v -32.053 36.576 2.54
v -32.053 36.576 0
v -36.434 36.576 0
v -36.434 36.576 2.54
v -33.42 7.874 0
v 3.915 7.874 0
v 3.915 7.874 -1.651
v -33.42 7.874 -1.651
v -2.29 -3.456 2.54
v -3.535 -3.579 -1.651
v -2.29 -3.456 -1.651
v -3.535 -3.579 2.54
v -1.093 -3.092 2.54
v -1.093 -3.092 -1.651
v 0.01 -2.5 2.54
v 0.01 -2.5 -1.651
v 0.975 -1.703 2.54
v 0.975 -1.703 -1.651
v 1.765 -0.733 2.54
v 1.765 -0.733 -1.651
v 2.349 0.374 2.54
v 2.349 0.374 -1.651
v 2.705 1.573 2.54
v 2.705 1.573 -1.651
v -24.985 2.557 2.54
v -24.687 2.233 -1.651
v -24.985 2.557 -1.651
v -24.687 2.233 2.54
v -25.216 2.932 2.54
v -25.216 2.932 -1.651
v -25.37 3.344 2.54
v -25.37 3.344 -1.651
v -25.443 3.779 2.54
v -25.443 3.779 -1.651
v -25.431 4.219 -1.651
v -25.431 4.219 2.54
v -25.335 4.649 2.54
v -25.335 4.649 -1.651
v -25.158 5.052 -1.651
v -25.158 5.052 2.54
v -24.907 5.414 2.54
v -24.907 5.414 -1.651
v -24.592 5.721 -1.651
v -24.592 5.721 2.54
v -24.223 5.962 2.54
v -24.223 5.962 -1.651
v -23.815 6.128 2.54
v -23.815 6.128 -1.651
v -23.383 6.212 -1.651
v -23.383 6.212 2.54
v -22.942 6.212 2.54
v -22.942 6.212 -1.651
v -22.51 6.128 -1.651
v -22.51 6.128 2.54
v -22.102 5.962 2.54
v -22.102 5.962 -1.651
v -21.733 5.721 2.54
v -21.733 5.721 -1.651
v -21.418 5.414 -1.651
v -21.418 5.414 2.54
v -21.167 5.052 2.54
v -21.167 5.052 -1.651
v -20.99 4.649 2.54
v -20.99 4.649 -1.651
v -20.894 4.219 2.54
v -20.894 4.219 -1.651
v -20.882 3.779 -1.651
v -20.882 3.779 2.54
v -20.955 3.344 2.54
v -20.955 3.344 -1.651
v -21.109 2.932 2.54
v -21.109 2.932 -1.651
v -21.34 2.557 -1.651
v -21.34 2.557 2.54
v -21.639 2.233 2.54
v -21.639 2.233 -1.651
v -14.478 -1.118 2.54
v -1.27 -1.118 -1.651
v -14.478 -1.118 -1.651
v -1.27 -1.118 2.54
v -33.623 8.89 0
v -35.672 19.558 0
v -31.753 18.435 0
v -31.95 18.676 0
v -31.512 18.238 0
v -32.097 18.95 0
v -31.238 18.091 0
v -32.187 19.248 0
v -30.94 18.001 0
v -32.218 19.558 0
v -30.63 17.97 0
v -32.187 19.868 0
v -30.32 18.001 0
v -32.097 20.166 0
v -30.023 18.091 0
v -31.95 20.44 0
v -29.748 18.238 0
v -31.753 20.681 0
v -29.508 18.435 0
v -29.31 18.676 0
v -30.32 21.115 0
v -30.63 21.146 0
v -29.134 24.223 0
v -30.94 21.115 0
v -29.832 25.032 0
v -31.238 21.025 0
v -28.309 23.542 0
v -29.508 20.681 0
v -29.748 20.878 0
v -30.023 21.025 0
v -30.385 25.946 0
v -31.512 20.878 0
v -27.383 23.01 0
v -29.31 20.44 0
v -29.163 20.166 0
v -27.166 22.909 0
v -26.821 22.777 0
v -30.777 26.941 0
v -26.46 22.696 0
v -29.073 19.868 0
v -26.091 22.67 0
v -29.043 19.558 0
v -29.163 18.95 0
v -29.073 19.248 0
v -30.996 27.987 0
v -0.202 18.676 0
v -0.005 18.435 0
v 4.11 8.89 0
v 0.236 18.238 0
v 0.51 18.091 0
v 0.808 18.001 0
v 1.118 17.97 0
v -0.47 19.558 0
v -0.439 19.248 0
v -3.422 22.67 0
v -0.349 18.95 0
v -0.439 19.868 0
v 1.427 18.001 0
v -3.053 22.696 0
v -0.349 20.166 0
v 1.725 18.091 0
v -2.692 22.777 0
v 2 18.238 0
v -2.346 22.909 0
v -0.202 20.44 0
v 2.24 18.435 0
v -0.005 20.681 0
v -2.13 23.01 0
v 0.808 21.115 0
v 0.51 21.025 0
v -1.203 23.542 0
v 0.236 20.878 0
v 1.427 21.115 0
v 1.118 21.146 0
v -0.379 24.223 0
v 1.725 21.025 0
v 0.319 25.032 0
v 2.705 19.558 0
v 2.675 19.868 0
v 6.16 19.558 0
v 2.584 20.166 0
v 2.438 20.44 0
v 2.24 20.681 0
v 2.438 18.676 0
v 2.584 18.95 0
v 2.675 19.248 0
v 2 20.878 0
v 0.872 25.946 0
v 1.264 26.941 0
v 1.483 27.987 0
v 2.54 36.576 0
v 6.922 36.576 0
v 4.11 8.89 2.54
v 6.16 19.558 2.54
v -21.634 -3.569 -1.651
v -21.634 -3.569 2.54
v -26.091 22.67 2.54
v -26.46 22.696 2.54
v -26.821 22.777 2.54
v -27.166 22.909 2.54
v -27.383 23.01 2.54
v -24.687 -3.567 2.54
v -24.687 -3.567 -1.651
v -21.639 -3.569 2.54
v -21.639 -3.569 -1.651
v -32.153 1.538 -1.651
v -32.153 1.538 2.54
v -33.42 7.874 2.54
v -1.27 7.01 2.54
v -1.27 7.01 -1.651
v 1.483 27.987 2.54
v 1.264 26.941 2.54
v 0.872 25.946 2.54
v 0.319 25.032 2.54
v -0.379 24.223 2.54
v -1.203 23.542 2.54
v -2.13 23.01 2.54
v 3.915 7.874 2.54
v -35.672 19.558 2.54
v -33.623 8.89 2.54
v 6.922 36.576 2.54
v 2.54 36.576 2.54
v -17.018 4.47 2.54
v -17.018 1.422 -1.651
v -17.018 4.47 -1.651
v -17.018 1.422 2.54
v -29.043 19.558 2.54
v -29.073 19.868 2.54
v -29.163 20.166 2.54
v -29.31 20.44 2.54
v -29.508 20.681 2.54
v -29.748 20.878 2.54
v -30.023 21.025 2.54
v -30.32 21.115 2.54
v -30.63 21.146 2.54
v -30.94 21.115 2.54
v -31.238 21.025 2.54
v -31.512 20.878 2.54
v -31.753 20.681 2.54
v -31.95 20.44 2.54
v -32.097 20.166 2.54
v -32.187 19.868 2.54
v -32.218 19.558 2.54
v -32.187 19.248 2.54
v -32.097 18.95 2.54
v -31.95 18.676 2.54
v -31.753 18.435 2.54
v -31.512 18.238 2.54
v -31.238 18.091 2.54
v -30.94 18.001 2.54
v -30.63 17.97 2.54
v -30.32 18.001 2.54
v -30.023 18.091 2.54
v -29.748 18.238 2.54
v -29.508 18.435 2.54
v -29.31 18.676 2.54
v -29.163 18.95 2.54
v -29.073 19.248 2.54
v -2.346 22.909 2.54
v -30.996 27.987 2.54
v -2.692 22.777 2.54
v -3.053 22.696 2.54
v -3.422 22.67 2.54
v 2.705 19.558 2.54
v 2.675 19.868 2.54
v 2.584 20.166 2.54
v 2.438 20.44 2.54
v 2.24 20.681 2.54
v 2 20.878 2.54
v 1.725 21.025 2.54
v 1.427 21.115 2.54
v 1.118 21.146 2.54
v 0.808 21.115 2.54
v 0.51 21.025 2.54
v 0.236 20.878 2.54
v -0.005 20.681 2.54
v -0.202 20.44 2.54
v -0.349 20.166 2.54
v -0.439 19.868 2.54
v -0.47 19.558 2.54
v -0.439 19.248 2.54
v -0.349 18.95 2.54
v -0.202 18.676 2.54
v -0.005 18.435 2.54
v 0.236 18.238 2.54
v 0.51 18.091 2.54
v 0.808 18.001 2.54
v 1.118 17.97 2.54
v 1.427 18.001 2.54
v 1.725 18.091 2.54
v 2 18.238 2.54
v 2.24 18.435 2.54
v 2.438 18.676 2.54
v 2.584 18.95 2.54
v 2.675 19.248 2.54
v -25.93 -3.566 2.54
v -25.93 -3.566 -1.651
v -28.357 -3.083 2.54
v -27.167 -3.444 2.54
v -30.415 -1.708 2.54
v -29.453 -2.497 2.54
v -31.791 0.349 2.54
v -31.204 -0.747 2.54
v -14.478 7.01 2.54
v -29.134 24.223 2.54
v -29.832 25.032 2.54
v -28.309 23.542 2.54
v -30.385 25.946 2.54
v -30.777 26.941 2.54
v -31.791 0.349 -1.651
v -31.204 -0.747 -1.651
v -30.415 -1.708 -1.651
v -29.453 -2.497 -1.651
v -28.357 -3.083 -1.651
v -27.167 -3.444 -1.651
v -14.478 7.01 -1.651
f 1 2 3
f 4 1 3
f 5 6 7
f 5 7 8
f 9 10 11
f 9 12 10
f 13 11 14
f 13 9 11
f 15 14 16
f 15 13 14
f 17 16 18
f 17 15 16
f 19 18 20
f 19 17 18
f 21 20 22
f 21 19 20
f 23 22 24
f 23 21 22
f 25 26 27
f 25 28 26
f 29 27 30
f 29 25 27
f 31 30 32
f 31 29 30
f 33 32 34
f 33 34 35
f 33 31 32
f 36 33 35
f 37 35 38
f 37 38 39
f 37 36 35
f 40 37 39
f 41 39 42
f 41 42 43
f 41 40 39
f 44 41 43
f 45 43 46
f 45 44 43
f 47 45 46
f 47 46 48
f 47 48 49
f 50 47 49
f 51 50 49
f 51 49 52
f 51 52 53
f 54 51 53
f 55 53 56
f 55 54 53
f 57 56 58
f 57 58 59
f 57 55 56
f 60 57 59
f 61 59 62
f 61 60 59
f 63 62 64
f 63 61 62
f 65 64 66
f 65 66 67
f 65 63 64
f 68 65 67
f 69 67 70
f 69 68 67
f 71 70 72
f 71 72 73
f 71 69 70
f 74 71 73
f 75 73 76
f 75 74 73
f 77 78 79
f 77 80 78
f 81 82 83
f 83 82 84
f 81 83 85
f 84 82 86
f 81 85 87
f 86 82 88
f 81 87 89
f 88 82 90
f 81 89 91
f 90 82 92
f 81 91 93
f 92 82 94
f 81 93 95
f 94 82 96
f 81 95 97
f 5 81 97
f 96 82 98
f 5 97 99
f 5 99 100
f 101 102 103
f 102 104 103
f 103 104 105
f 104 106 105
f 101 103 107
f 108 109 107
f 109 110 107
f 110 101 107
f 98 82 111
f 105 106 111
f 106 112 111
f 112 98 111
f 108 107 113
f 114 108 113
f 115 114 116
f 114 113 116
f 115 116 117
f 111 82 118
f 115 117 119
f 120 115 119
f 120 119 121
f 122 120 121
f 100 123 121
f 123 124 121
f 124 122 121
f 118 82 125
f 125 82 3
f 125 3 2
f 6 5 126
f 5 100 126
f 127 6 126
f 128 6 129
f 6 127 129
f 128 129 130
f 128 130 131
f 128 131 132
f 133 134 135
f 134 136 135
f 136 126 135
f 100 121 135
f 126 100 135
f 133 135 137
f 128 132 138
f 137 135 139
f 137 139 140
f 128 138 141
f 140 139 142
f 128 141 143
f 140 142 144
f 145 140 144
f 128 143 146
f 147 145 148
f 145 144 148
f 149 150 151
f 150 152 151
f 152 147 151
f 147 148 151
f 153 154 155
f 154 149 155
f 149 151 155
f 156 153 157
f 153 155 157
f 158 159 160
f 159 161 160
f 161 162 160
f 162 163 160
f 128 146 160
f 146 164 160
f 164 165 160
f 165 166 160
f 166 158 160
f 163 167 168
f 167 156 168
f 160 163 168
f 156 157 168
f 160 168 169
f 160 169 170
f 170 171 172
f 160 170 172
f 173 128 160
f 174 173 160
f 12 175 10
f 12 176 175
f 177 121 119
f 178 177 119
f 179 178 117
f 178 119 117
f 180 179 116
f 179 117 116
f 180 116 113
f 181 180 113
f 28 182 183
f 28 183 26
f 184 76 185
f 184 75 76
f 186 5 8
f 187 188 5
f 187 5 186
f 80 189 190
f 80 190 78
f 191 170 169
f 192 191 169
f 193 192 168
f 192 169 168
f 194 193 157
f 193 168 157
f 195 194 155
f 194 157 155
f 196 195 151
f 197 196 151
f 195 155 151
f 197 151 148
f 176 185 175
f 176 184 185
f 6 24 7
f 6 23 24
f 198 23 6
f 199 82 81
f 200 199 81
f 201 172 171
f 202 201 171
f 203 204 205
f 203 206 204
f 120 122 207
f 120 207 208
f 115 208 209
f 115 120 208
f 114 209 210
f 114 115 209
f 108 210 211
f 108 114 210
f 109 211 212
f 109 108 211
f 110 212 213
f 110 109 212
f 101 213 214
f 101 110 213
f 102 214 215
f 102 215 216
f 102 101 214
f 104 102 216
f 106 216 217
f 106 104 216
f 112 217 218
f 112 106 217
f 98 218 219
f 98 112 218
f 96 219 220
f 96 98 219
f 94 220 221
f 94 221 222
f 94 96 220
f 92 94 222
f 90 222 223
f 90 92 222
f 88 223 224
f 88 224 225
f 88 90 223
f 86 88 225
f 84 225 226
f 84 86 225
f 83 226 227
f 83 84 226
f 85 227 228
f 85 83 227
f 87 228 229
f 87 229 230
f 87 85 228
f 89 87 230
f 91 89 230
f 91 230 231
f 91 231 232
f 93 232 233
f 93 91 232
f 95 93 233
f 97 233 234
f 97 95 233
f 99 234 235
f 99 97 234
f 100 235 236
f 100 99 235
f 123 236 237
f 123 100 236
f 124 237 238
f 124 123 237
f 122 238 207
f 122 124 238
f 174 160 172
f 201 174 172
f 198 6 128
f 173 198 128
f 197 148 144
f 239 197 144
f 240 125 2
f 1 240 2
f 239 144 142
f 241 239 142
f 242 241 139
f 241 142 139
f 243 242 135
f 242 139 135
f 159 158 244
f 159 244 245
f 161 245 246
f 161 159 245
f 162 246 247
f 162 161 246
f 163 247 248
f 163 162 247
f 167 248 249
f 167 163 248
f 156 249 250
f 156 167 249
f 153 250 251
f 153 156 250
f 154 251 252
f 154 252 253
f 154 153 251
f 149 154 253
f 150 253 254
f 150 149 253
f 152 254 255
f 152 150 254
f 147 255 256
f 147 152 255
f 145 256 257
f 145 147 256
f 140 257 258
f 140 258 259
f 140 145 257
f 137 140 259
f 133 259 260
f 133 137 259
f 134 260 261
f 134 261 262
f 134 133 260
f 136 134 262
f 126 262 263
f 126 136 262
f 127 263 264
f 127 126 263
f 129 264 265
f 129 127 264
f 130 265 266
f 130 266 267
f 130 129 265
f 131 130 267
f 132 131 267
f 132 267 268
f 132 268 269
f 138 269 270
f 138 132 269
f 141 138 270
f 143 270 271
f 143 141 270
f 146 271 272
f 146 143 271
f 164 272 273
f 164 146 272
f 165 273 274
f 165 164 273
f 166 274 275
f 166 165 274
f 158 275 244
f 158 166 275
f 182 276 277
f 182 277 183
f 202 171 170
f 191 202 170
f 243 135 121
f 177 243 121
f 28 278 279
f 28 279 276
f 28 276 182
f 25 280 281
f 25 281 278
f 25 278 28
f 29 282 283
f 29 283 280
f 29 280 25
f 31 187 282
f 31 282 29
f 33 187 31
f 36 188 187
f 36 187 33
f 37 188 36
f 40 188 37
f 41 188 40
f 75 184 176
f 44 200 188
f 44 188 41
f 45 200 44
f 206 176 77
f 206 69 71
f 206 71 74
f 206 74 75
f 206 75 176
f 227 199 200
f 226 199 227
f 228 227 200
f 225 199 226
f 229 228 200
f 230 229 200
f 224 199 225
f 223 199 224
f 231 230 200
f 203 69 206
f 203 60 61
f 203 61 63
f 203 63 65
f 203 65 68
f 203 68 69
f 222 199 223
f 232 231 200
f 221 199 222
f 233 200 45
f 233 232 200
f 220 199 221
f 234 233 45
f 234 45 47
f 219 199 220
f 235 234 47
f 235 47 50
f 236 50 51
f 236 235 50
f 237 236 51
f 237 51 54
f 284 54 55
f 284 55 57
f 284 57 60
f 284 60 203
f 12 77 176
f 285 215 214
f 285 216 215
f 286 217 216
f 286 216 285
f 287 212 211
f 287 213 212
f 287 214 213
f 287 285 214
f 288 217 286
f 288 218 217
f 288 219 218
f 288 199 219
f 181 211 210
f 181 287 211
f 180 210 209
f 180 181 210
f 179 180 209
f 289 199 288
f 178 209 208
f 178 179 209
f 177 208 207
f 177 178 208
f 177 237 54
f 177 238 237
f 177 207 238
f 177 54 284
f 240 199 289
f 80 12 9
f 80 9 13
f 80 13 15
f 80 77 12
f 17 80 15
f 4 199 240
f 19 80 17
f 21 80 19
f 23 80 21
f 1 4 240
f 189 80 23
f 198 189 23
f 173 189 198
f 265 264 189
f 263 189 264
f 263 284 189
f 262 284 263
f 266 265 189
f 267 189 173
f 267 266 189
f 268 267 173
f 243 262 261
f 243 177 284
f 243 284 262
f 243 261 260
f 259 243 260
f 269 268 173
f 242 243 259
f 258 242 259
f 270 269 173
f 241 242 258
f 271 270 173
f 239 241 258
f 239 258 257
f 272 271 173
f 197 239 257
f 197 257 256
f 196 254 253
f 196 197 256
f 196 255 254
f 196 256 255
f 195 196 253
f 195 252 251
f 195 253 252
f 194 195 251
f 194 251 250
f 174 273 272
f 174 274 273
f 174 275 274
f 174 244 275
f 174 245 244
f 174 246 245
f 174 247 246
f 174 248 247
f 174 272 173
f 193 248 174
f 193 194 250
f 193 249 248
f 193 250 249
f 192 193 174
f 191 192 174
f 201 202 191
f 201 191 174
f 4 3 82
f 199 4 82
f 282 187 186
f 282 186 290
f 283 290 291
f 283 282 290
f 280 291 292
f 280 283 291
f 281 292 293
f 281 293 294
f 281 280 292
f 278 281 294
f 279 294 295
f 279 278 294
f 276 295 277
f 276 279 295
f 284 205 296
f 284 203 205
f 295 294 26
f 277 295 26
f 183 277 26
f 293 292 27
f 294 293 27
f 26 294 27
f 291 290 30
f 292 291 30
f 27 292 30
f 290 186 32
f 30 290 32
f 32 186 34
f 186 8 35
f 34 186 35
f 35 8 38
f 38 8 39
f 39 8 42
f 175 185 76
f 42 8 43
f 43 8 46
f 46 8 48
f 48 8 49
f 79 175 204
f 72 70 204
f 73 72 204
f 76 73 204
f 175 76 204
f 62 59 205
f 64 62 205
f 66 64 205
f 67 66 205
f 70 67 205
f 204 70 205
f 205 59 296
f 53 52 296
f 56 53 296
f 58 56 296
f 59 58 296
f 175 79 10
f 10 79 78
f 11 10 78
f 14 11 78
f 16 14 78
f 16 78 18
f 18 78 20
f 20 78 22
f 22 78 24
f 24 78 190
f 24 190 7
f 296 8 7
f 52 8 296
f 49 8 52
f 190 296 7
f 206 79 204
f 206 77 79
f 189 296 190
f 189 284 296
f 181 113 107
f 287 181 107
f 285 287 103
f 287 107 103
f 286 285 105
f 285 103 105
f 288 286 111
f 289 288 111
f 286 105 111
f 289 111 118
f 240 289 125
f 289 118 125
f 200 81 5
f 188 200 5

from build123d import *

# Parameters (mm, degrees)
F0_R     = 1.5875
F1_DEPTH = 2.54
F2_DEPTH = 2.54
F3_DEPTH = 1.651


with BuildPart() as f1:
    # F0 (on Top) → F1 (new body)
    with BuildSketch(Plane.XY):
        with BuildLine():
            ThreePointArc((-2.34618, 22.908559), (-2.870941, 22.729985), (-3.421944, 22.6695))
            Line((-3.421944, 22.6695), (-26.090599, 22.6695))
            ThreePointArc((-26.090599, 22.6695), (-26.641602, 22.729985), (-27.166363, 22.908559))
            Line((-27.166363, 22.908559), (-27.382744, 23.009724))
            ThreePointArc((-27.382744, 23.009724), (-29.832018, 25.031607), (-30.995815, 27.986693))
            Line((-30.995815, 27.986693), (-32.052543, 36.576))
            Line((-32.052543, 36.576), (-36.434043, 36.576))
            Line((-36.434043, 36.576), (-35.672043, 19.558))
            Line((-35.672043, 19.558), (-33.622761, 8.89))
            Line((-33.622761, 8.89), (-33.419602, 7.874))
            Line((-33.419602, 7.874), (3.915098, 7.874))
            Line((3.915098, 7.874), (4.110263, 8.89))
            Line((4.110263, 8.89), (6.1595, 19.558))
            Line((6.1595, 19.558), (6.9215, 36.576))
            Line((6.9215, 36.576), (2.54, 36.576))
            Line((2.54, 36.576), (1.483271, 27.986693))
            ThreePointArc((1.483271, 27.986693), (0.319475, 25.031607), (-2.129799, 23.009724))
            Line((-2.129799, 23.009724), (-2.34618, 22.908559))
        make_face()
        with Locations((-30.630143, 19.558)):
            Circle(F0_R, mode=Mode.SUBTRACT)
        with Locations((1.1176, 19.558)):
            Circle(F0_R, mode=Mode.SUBTRACT)
    extrude(amount=F1_DEPTH)

    # F0 (on Top) → F2 (join)
    with BuildSketch(Plane.XY):
        with BuildLine():
            Line((2.704744, 1.573093), (3.915098, 7.874))
            Line((3.915098, 7.874), (-33.419602, 7.874))
            Line((-33.419602, 7.874), (-32.152758, 1.5385))
            ThreePointArc((-32.152758, 1.5385), (-29.95333, -2.125914), (-25.9296, -3.566403))
            Line((-25.9296, -3.566403), (-24.686543, -3.567104))
            Line((-24.686543, -3.567104), (-24.686543, 2.233116))
            ThreePointArc((-24.686543, 2.233116), (-23.162543, 6.223), (-21.638543, 2.233116))
            Line((-21.638543, 2.233116), (-21.638543, -3.568821))
            Line((-21.638543, -3.568821), (-21.634144, -3.568824))
            Line((-21.634144, -3.568824), (-3.534824, -3.579023))
            ThreePointArc((-3.534824, -3.579023), (0.511873, -2.125521), (2.704744, 1.573093))
        make_face()
        Polygon((-1.27, 7.0104), (-1.27, -1.1176), (-14.478, -1.1176), (-17.018, 1.4224), (-17.018, 4.4704), (-14.478, 7.0104), align=None, mode=Mode.SUBTRACT)
    extrude(amount=F2_DEPTH)

    # F0 (on Top) → F3 (join)
    with BuildSketch(Plane.XY):
        with BuildLine():
            Line((2.704744, 1.573093), (3.915098, 7.874))
            Line((3.915098, 7.874), (-33.419602, 7.874))
            Line((-33.419602, 7.874), (-32.152758, 1.5385))
            ThreePointArc((-32.152758, 1.5385), (-29.95333, -2.125914), (-25.9296, -3.566403))
            Line((-25.9296, -3.566403), (-24.686543, -3.567104))
            Line((-24.686543, -3.567104), (-24.686543, 2.233116))
            ThreePointArc((-24.686543, 2.233116), (-23.162543, 6.223), (-21.638543, 2.233116))
            Line((-21.638543, 2.233116), (-21.638543, -3.568821))
            Line((-21.638543, -3.568821), (-21.634144, -3.568824))
            Line((-21.634144, -3.568824), (-3.534824, -3.579023))
            ThreePointArc((-3.534824, -3.579023), (0.511873, -2.125521), (2.704744, 1.573093))
        make_face()
        Polygon((-1.27, 7.0104), (-1.27, -1.1176), (-14.478, -1.1176), (-17.018, 1.4224), (-17.018, 4.4704), (-14.478, 7.0104), align=None, mode=Mode.SUBTRACT)
    extrude(amount=-F3_DEPTH)


solid = f1.part
